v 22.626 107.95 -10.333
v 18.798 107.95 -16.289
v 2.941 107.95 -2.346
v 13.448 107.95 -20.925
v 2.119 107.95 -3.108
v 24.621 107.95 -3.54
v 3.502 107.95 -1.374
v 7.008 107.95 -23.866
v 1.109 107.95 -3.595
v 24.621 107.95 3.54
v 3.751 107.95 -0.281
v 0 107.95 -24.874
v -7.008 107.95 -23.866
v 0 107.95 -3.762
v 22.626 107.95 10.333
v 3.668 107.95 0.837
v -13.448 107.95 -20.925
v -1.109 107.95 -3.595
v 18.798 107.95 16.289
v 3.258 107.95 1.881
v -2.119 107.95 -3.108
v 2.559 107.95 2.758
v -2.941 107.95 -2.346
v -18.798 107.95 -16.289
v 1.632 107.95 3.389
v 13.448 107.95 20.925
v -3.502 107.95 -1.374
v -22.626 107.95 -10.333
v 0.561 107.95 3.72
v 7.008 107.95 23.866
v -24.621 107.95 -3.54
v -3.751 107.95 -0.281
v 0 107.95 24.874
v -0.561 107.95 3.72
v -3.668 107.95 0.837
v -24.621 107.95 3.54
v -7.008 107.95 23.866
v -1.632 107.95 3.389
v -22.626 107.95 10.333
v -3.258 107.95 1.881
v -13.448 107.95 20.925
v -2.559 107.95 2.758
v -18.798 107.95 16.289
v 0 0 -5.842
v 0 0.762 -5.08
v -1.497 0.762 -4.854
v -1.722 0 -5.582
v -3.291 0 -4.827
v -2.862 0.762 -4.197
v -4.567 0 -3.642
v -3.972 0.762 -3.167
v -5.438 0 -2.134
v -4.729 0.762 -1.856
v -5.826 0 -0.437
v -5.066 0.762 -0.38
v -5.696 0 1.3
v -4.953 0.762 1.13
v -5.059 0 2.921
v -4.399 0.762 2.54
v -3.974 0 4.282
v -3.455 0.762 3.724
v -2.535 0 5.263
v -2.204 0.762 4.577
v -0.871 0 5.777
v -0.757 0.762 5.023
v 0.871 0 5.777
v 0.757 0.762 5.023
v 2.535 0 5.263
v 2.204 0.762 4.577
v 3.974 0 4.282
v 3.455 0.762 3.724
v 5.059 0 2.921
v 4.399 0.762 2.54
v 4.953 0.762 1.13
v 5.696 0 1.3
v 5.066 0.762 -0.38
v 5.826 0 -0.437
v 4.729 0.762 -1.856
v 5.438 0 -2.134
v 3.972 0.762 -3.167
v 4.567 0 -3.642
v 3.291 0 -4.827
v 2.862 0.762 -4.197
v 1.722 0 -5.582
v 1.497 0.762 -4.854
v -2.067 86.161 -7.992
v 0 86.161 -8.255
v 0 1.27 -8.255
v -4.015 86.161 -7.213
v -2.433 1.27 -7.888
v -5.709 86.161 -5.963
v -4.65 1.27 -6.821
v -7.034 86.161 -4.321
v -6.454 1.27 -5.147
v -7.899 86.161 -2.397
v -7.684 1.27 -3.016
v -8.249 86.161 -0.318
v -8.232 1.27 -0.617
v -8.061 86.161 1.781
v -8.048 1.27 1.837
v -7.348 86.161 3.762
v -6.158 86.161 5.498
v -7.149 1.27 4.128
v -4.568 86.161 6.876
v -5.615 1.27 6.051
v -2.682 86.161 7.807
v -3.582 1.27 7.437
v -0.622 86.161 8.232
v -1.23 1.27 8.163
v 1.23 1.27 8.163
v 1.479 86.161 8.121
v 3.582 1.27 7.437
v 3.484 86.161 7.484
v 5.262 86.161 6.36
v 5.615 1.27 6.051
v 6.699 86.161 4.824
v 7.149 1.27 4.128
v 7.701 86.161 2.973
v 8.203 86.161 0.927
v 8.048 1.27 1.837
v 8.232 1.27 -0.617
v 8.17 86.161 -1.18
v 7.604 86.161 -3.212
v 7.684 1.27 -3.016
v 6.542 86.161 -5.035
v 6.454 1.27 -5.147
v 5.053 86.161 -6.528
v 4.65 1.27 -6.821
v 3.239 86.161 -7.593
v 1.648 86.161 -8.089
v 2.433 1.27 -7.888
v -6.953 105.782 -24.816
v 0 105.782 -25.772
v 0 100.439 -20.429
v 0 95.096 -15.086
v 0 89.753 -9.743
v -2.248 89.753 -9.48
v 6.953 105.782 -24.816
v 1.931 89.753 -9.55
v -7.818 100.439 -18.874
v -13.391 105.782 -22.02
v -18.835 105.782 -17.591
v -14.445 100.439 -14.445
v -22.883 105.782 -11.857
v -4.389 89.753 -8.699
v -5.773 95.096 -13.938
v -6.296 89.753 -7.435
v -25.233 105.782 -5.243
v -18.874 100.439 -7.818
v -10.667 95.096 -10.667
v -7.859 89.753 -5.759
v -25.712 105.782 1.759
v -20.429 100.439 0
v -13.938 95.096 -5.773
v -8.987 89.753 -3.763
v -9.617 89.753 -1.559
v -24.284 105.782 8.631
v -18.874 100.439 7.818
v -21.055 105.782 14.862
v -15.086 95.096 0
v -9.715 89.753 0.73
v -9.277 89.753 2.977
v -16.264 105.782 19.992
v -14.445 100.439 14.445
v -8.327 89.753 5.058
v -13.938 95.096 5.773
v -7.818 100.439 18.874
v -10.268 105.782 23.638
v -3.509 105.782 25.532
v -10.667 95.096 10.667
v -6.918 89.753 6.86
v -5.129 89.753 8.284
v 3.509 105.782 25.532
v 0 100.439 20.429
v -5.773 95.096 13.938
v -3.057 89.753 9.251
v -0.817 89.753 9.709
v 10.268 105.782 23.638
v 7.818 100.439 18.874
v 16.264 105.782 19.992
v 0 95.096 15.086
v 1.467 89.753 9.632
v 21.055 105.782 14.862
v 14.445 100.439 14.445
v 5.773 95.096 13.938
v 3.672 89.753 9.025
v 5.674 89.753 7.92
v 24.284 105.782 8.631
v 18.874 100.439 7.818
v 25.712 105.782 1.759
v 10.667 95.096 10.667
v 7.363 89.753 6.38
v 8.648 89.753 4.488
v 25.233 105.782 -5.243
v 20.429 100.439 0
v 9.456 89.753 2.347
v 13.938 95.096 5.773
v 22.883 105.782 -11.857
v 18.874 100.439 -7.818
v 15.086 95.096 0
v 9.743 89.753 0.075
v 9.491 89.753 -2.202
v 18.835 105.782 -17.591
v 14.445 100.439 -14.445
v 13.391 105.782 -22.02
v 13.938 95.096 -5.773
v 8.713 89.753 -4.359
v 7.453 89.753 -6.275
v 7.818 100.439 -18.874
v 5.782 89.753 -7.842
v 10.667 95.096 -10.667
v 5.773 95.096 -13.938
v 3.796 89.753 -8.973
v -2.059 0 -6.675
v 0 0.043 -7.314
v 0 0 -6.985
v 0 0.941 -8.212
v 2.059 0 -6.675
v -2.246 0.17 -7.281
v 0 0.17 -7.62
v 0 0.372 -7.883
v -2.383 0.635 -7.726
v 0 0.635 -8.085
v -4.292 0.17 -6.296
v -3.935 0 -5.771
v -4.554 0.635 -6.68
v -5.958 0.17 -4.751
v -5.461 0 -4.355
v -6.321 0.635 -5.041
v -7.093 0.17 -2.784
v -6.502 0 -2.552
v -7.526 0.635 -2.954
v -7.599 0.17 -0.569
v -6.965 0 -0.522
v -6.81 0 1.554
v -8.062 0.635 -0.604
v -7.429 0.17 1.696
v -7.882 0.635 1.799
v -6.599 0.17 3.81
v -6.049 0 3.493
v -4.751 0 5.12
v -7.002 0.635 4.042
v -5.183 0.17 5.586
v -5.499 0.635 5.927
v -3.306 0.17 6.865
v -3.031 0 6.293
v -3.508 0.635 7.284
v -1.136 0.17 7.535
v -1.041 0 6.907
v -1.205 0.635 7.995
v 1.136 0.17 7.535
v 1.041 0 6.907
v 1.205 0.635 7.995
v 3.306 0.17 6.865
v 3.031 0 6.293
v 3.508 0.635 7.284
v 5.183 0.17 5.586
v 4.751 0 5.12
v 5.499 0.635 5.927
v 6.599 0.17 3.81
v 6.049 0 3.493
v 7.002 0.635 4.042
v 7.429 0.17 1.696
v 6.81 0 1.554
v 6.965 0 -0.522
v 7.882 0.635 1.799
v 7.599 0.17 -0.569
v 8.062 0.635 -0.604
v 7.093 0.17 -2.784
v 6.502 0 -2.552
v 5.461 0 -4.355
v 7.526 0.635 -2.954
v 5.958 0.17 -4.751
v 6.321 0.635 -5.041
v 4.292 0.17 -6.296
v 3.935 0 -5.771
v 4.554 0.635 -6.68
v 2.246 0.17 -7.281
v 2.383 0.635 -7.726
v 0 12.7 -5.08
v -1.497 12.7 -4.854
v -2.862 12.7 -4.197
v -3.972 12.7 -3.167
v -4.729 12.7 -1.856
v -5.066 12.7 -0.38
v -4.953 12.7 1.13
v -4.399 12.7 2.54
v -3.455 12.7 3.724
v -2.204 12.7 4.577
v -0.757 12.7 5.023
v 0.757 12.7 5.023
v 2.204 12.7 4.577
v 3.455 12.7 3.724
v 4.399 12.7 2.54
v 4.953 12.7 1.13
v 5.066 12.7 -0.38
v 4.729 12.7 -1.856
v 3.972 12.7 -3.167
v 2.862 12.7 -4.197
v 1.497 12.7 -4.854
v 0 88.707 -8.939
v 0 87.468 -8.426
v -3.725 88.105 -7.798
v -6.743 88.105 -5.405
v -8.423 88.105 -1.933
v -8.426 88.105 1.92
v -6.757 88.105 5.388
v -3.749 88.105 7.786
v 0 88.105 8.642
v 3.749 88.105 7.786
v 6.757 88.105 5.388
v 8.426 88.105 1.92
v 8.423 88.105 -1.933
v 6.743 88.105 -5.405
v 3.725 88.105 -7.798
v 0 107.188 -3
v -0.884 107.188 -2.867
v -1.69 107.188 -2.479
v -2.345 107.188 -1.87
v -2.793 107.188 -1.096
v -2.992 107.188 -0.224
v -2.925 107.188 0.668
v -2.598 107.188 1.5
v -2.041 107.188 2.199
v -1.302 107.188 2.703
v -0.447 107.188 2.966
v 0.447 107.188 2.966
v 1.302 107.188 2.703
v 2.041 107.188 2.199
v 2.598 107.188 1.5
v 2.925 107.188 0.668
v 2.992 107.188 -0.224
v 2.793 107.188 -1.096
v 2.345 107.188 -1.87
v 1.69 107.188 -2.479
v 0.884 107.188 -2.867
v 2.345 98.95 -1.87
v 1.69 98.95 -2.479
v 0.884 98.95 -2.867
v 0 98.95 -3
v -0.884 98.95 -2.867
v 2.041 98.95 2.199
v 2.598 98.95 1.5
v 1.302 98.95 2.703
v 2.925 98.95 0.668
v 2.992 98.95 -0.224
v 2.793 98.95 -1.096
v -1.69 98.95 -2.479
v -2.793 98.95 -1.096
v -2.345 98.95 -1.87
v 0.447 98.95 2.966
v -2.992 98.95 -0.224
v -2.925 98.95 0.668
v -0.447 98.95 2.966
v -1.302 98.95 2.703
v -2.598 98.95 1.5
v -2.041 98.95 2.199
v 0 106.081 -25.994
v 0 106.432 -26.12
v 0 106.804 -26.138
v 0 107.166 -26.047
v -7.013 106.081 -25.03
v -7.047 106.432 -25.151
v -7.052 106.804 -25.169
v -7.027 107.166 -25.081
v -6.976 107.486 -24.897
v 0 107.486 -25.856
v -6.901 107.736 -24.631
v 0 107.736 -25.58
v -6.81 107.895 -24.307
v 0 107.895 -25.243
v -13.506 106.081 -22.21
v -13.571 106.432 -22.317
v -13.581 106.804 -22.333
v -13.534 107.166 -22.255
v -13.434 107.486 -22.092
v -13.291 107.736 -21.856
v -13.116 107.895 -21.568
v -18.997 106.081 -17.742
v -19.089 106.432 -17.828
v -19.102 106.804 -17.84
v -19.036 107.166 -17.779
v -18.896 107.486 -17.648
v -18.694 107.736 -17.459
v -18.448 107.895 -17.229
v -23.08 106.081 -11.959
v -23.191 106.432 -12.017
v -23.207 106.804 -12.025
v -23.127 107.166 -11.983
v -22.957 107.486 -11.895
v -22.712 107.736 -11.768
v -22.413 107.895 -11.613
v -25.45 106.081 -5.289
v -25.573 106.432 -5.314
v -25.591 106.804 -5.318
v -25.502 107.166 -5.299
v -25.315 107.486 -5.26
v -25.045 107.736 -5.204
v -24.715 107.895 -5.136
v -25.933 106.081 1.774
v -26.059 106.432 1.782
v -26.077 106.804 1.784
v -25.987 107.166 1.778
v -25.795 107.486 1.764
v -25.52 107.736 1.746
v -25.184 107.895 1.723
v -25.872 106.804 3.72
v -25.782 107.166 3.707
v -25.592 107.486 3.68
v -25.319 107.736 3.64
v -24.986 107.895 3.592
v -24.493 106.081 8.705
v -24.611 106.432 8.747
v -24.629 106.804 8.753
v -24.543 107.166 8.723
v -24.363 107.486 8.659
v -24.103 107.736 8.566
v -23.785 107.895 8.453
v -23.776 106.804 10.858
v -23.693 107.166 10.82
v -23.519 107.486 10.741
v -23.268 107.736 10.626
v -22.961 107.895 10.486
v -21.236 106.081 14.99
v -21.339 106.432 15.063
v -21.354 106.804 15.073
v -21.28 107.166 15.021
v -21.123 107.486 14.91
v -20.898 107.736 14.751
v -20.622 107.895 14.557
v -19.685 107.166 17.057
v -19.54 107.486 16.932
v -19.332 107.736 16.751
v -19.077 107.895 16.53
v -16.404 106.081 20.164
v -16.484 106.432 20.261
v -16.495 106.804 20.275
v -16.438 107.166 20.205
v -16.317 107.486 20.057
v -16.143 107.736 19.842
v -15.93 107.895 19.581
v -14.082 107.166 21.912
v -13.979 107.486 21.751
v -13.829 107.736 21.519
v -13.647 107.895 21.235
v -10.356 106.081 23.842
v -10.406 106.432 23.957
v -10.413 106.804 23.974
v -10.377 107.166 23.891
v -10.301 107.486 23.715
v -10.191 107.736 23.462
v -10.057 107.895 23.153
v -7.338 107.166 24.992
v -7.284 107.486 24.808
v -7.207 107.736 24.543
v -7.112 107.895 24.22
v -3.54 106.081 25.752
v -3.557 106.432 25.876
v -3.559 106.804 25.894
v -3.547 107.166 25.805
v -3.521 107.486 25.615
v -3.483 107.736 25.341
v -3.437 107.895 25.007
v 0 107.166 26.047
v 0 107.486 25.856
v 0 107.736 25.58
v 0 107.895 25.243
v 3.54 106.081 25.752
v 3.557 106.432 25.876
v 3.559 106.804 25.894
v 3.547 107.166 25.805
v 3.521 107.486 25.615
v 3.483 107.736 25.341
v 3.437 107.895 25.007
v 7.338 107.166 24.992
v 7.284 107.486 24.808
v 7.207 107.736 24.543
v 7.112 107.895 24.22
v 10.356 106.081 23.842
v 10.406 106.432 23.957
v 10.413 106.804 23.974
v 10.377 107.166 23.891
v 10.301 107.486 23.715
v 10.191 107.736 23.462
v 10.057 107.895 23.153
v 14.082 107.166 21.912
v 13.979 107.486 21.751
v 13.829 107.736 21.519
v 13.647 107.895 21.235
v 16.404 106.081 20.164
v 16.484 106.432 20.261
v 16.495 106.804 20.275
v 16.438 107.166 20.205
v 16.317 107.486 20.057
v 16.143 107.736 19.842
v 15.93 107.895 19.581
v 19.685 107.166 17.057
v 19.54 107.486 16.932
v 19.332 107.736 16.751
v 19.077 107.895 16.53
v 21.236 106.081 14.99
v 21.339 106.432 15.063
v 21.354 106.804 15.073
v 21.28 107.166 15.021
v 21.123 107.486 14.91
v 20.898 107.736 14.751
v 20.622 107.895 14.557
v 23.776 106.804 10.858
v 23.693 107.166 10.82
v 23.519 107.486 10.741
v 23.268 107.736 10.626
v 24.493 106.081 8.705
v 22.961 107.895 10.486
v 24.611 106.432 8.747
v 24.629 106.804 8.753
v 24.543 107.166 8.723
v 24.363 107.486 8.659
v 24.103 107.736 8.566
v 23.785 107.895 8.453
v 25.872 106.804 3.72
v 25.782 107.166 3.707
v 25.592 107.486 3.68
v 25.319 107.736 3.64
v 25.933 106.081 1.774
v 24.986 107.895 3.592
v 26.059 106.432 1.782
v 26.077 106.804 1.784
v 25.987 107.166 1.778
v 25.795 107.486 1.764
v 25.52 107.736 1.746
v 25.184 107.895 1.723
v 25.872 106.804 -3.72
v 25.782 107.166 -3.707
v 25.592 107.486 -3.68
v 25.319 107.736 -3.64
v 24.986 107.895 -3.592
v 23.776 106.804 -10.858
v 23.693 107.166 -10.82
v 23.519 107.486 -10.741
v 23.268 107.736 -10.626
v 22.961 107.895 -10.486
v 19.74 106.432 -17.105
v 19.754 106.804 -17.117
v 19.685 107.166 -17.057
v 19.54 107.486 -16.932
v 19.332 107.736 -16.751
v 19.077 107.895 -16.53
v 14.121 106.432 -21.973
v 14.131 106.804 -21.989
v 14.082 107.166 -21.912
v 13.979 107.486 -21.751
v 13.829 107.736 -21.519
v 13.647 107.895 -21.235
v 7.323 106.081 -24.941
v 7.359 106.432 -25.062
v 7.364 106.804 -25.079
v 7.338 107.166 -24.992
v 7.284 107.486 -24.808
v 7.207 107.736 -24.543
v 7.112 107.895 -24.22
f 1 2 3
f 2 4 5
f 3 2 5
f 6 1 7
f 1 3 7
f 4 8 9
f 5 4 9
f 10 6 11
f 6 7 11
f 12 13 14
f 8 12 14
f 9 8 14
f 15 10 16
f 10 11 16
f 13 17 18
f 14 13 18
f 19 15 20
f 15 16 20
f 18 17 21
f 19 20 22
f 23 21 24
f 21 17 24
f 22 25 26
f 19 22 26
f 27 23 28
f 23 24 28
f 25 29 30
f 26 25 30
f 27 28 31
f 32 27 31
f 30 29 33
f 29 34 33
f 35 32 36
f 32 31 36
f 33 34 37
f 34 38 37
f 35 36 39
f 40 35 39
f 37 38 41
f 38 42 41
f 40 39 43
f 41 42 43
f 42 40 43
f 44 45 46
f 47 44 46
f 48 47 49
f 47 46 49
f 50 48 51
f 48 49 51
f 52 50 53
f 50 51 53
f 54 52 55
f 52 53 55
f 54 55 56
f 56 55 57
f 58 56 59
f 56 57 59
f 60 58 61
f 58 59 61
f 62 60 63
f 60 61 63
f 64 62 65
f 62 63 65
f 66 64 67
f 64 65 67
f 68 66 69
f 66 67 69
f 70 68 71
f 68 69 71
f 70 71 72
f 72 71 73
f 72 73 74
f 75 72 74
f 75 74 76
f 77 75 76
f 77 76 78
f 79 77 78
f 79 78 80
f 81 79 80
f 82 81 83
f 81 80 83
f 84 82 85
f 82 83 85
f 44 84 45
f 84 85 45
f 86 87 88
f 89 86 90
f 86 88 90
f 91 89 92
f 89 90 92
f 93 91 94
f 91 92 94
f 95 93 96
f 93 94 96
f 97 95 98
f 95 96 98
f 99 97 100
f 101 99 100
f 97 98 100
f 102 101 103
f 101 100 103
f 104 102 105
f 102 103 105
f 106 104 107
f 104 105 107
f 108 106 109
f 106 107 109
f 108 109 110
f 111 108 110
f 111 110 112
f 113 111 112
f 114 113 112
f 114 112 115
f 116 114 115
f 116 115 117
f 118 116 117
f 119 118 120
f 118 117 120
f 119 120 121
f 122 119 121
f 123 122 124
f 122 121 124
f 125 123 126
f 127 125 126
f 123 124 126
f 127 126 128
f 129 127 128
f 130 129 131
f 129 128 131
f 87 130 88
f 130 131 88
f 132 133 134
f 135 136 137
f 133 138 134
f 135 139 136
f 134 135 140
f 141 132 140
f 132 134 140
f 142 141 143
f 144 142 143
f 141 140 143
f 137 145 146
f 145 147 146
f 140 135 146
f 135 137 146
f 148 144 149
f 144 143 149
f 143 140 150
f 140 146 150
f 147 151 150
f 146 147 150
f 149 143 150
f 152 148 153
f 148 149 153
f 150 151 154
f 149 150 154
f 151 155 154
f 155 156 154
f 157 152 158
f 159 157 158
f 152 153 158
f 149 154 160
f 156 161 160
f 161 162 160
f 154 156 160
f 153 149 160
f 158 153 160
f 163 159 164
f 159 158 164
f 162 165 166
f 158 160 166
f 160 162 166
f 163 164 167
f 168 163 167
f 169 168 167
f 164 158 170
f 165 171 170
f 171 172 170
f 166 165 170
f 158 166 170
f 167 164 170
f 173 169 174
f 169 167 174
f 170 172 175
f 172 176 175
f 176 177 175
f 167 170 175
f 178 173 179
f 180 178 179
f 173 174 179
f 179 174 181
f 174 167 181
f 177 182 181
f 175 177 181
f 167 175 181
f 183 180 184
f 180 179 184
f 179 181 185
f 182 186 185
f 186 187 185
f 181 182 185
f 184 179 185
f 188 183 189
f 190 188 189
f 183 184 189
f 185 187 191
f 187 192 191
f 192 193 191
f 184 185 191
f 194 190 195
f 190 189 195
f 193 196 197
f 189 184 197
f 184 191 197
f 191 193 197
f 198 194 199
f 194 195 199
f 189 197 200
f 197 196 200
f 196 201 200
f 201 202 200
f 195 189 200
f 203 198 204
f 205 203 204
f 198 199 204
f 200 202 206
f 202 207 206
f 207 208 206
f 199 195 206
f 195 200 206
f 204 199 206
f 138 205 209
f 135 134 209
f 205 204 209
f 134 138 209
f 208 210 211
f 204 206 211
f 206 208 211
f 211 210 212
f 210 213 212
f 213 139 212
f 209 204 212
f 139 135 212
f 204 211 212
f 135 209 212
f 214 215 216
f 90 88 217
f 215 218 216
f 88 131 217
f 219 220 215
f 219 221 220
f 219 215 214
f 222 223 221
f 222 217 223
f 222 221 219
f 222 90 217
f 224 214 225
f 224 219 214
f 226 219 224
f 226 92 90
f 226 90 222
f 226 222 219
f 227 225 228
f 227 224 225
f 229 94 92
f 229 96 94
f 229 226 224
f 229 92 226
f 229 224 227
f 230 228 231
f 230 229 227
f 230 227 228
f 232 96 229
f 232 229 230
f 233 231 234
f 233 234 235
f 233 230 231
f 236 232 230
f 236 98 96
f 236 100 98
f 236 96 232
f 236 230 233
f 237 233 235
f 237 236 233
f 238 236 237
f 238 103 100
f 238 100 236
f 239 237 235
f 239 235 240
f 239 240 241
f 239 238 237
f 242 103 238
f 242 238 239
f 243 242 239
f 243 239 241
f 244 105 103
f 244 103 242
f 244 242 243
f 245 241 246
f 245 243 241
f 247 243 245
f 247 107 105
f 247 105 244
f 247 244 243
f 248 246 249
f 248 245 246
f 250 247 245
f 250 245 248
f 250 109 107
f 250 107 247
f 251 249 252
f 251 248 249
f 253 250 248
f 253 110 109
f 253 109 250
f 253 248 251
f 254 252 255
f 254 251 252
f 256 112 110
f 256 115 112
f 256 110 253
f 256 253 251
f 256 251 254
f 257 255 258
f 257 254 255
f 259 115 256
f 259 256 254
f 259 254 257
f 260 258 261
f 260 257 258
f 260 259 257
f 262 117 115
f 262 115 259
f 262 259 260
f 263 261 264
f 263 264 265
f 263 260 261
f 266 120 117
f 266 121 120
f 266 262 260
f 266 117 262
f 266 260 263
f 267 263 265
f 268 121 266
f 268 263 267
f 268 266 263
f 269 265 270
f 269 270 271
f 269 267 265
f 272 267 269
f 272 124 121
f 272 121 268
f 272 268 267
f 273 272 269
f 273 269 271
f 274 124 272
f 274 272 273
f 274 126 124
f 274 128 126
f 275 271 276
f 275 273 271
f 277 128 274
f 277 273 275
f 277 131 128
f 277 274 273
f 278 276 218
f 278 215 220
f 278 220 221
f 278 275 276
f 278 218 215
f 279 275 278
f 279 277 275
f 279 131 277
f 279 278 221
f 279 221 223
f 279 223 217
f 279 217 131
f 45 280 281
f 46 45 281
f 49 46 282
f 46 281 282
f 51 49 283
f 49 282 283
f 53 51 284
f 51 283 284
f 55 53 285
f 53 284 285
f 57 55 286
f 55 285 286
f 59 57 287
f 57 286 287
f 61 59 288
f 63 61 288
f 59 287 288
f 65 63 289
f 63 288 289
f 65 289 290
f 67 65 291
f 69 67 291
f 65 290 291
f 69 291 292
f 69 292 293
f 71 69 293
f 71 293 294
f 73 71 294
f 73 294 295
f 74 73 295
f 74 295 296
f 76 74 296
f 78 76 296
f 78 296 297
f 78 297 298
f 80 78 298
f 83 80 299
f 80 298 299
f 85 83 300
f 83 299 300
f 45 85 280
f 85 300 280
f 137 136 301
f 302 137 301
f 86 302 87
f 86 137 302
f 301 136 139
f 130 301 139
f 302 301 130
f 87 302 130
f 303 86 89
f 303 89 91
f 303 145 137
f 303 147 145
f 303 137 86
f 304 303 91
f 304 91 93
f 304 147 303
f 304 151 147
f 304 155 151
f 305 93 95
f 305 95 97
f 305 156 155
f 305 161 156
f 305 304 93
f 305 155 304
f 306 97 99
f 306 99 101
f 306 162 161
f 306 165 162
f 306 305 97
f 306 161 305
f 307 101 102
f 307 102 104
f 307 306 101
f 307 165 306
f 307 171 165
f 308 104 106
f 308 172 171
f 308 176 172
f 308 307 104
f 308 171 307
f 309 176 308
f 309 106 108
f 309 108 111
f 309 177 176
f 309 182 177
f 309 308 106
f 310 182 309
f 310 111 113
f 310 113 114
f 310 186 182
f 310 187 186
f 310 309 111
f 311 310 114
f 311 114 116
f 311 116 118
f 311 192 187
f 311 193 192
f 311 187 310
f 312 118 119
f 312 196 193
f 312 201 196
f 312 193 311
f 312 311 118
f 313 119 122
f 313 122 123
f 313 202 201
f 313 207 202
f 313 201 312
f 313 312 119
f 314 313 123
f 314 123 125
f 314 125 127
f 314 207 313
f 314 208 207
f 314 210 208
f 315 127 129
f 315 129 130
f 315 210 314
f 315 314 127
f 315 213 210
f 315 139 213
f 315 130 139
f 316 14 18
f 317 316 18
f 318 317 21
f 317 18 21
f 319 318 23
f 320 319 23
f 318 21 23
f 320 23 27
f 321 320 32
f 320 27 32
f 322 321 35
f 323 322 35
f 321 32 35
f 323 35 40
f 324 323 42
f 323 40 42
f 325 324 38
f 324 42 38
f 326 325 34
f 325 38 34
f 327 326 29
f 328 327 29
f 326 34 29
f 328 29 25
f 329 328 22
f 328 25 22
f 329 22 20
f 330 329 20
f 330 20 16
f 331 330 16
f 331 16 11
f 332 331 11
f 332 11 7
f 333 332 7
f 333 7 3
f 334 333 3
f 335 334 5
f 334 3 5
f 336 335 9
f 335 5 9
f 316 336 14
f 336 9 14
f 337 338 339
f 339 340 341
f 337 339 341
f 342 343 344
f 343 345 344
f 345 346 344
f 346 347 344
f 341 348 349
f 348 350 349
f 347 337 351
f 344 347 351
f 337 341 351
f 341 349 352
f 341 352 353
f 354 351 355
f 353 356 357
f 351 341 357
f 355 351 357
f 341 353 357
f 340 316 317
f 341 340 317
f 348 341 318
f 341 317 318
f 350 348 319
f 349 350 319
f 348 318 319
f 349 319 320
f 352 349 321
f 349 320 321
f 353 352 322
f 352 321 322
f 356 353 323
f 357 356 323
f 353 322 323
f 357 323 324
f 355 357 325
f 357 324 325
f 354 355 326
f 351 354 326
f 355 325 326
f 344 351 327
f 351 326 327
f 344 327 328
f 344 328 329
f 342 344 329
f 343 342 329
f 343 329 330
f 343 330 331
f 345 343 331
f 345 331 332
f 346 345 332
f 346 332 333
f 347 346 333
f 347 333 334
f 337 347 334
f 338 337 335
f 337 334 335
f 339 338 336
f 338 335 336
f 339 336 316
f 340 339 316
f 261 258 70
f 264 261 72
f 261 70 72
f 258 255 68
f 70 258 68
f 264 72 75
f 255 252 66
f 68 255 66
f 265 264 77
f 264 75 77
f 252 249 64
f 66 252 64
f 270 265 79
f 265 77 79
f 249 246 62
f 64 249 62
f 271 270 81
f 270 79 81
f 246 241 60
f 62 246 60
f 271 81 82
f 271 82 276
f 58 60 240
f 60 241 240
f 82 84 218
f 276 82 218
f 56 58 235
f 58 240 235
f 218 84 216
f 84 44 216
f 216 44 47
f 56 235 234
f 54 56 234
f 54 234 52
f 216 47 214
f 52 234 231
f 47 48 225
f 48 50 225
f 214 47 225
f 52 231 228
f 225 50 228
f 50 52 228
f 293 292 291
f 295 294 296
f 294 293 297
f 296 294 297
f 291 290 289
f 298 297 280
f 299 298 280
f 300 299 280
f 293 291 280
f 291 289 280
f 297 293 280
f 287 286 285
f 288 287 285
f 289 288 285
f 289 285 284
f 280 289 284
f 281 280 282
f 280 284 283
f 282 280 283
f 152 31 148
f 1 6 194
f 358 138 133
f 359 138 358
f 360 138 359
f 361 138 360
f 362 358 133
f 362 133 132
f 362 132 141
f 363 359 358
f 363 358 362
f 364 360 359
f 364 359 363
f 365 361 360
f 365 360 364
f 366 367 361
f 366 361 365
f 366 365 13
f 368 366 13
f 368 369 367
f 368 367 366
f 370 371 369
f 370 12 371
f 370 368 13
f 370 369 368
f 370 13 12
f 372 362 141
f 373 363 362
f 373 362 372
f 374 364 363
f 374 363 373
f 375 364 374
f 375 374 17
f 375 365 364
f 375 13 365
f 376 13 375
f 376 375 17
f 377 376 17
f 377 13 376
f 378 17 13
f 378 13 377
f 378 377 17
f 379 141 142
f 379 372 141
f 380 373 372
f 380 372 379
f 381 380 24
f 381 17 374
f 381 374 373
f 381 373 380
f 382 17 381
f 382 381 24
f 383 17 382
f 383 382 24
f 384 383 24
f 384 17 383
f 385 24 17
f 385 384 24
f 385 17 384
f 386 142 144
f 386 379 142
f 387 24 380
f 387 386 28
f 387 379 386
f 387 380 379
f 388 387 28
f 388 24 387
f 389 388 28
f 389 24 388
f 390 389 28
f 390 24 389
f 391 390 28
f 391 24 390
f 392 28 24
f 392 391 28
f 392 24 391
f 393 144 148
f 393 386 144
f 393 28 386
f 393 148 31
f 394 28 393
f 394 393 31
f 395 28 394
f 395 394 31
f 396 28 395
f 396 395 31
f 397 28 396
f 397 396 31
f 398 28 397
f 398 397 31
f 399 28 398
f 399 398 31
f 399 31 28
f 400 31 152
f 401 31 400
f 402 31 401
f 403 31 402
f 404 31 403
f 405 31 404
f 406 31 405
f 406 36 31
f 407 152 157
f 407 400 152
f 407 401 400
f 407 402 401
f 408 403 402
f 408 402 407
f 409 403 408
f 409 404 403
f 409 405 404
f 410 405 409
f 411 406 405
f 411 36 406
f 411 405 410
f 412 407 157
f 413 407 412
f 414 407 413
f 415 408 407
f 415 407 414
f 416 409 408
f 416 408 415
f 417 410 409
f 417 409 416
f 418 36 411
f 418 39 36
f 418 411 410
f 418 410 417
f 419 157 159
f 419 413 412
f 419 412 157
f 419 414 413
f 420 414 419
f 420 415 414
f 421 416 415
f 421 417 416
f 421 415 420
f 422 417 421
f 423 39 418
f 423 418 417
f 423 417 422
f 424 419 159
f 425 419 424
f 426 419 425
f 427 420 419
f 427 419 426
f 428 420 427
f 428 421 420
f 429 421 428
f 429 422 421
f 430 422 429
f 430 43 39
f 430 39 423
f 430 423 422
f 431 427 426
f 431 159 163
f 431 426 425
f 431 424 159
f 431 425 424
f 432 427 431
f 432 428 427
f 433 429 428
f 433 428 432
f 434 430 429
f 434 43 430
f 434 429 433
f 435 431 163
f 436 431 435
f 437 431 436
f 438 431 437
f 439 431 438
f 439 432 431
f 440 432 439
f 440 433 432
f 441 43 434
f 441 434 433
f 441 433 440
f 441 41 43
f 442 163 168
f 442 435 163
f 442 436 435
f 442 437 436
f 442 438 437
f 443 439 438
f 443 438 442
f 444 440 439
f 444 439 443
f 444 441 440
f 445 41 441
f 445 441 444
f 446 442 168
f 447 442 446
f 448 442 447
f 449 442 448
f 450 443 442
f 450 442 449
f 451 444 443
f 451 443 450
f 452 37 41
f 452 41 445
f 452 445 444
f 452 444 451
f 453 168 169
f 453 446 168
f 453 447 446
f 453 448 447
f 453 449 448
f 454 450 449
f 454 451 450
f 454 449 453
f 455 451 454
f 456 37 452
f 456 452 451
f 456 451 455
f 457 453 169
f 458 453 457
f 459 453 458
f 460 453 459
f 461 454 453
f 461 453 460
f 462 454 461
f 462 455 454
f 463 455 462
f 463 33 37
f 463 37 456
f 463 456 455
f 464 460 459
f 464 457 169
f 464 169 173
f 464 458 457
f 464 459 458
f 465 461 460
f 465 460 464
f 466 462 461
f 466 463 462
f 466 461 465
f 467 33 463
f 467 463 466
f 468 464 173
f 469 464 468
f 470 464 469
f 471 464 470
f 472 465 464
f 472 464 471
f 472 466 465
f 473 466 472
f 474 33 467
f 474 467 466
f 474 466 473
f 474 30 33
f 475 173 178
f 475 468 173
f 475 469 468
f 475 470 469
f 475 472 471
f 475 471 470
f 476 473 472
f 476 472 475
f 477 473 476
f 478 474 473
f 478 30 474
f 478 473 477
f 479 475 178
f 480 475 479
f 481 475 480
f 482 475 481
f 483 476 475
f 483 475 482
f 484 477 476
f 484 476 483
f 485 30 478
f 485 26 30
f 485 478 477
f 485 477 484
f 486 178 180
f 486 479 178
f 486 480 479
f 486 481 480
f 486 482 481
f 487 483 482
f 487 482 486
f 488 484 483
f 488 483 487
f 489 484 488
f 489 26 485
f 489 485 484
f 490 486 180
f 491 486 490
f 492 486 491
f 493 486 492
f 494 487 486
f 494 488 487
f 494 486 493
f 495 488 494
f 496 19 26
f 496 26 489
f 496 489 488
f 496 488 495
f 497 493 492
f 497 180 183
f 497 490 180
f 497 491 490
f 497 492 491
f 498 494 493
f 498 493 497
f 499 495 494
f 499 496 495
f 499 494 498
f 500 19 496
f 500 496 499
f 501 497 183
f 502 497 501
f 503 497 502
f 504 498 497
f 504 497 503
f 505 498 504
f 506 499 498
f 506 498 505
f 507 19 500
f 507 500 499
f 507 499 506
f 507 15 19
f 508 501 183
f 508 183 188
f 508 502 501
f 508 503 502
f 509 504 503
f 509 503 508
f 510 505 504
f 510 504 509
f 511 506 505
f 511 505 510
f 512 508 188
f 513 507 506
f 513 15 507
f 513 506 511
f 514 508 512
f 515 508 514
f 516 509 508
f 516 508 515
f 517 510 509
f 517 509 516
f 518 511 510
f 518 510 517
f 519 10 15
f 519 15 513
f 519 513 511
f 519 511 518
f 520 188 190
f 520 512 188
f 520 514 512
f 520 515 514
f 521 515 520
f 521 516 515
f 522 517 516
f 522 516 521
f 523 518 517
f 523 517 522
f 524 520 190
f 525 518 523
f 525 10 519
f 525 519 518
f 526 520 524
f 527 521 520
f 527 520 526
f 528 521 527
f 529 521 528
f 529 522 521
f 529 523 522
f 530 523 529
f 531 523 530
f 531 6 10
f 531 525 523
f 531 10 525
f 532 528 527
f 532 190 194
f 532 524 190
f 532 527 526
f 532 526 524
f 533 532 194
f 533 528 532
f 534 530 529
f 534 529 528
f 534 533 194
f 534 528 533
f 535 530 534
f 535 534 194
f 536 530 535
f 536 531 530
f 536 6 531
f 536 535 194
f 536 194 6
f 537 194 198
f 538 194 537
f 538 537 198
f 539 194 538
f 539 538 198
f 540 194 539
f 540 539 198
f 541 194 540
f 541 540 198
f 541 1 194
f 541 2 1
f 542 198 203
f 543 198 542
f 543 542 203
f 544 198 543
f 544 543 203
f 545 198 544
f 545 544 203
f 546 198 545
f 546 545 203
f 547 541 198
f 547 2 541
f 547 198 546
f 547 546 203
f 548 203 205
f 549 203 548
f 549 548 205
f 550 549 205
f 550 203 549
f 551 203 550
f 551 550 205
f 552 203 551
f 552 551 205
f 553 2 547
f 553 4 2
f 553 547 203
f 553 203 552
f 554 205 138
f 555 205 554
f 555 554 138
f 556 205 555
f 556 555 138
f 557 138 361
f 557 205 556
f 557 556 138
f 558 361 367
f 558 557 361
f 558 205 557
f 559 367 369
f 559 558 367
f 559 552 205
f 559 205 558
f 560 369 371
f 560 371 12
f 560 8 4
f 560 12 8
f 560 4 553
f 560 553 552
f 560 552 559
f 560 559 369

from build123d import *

# Parameters (mm, degrees)
CHAMFER1_SIZE = 0.762
FILLET1_R     = 1.27
FILLET2_R     = 1.27
FILLET3_R     = 5.08


with BuildPart() as part:
    # Sketch1 → Revolve1 (revolve)
    with BuildSketch(Plane.XY, mode=Mode.PRIVATE) as revolve1_sk:
        Polygon((-27.94, 107.95), (-8.255, 88.265), (-8.255, 0), (-5.08, 0), (-5.08, 12.7), (0, 12.7), (0, 98.95), (-3, 98.95), (-3, 107.95), align=None)
    revolve(revolve1_sk.sketch.rotate(Axis((0, 12.7, 0), (0, 1, 0)), 270), axis=Axis((0, 12.7, 0), (0, 1, 0)))

    # Chamfer1
    chamfer1_edges = [part.edges().sort_by_distance(p)[0] for p in [
        (0, 0, 5.08),
        (0, 107.95, 3),
    ]]
    chamfer(chamfer1_edges, length=CHAMFER1_SIZE)

    # Fillet1
    fillet1_edges = [part.edges().sort_by_distance(p)[0] for p in [
        (0, 0, 8.255),
    ]]
    fillet(fillet1_edges, radius=FILLET1_R)

    # Fillet2
    fillet2_edges = [part.edges().sort_by_distance(p)[0] for p in [
        (0, 107.95, 27.94),
    ]]
    fillet(fillet2_edges, radius=FILLET2_R)

    # Fillet3
    fillet3_edges = [part.edges().sort_by_distance(p)[0] for p in [
        (0, 88.265, 8.255),
    ]]
    fillet(fillet3_edges, radius=FILLET3_R)


solid = part.part
